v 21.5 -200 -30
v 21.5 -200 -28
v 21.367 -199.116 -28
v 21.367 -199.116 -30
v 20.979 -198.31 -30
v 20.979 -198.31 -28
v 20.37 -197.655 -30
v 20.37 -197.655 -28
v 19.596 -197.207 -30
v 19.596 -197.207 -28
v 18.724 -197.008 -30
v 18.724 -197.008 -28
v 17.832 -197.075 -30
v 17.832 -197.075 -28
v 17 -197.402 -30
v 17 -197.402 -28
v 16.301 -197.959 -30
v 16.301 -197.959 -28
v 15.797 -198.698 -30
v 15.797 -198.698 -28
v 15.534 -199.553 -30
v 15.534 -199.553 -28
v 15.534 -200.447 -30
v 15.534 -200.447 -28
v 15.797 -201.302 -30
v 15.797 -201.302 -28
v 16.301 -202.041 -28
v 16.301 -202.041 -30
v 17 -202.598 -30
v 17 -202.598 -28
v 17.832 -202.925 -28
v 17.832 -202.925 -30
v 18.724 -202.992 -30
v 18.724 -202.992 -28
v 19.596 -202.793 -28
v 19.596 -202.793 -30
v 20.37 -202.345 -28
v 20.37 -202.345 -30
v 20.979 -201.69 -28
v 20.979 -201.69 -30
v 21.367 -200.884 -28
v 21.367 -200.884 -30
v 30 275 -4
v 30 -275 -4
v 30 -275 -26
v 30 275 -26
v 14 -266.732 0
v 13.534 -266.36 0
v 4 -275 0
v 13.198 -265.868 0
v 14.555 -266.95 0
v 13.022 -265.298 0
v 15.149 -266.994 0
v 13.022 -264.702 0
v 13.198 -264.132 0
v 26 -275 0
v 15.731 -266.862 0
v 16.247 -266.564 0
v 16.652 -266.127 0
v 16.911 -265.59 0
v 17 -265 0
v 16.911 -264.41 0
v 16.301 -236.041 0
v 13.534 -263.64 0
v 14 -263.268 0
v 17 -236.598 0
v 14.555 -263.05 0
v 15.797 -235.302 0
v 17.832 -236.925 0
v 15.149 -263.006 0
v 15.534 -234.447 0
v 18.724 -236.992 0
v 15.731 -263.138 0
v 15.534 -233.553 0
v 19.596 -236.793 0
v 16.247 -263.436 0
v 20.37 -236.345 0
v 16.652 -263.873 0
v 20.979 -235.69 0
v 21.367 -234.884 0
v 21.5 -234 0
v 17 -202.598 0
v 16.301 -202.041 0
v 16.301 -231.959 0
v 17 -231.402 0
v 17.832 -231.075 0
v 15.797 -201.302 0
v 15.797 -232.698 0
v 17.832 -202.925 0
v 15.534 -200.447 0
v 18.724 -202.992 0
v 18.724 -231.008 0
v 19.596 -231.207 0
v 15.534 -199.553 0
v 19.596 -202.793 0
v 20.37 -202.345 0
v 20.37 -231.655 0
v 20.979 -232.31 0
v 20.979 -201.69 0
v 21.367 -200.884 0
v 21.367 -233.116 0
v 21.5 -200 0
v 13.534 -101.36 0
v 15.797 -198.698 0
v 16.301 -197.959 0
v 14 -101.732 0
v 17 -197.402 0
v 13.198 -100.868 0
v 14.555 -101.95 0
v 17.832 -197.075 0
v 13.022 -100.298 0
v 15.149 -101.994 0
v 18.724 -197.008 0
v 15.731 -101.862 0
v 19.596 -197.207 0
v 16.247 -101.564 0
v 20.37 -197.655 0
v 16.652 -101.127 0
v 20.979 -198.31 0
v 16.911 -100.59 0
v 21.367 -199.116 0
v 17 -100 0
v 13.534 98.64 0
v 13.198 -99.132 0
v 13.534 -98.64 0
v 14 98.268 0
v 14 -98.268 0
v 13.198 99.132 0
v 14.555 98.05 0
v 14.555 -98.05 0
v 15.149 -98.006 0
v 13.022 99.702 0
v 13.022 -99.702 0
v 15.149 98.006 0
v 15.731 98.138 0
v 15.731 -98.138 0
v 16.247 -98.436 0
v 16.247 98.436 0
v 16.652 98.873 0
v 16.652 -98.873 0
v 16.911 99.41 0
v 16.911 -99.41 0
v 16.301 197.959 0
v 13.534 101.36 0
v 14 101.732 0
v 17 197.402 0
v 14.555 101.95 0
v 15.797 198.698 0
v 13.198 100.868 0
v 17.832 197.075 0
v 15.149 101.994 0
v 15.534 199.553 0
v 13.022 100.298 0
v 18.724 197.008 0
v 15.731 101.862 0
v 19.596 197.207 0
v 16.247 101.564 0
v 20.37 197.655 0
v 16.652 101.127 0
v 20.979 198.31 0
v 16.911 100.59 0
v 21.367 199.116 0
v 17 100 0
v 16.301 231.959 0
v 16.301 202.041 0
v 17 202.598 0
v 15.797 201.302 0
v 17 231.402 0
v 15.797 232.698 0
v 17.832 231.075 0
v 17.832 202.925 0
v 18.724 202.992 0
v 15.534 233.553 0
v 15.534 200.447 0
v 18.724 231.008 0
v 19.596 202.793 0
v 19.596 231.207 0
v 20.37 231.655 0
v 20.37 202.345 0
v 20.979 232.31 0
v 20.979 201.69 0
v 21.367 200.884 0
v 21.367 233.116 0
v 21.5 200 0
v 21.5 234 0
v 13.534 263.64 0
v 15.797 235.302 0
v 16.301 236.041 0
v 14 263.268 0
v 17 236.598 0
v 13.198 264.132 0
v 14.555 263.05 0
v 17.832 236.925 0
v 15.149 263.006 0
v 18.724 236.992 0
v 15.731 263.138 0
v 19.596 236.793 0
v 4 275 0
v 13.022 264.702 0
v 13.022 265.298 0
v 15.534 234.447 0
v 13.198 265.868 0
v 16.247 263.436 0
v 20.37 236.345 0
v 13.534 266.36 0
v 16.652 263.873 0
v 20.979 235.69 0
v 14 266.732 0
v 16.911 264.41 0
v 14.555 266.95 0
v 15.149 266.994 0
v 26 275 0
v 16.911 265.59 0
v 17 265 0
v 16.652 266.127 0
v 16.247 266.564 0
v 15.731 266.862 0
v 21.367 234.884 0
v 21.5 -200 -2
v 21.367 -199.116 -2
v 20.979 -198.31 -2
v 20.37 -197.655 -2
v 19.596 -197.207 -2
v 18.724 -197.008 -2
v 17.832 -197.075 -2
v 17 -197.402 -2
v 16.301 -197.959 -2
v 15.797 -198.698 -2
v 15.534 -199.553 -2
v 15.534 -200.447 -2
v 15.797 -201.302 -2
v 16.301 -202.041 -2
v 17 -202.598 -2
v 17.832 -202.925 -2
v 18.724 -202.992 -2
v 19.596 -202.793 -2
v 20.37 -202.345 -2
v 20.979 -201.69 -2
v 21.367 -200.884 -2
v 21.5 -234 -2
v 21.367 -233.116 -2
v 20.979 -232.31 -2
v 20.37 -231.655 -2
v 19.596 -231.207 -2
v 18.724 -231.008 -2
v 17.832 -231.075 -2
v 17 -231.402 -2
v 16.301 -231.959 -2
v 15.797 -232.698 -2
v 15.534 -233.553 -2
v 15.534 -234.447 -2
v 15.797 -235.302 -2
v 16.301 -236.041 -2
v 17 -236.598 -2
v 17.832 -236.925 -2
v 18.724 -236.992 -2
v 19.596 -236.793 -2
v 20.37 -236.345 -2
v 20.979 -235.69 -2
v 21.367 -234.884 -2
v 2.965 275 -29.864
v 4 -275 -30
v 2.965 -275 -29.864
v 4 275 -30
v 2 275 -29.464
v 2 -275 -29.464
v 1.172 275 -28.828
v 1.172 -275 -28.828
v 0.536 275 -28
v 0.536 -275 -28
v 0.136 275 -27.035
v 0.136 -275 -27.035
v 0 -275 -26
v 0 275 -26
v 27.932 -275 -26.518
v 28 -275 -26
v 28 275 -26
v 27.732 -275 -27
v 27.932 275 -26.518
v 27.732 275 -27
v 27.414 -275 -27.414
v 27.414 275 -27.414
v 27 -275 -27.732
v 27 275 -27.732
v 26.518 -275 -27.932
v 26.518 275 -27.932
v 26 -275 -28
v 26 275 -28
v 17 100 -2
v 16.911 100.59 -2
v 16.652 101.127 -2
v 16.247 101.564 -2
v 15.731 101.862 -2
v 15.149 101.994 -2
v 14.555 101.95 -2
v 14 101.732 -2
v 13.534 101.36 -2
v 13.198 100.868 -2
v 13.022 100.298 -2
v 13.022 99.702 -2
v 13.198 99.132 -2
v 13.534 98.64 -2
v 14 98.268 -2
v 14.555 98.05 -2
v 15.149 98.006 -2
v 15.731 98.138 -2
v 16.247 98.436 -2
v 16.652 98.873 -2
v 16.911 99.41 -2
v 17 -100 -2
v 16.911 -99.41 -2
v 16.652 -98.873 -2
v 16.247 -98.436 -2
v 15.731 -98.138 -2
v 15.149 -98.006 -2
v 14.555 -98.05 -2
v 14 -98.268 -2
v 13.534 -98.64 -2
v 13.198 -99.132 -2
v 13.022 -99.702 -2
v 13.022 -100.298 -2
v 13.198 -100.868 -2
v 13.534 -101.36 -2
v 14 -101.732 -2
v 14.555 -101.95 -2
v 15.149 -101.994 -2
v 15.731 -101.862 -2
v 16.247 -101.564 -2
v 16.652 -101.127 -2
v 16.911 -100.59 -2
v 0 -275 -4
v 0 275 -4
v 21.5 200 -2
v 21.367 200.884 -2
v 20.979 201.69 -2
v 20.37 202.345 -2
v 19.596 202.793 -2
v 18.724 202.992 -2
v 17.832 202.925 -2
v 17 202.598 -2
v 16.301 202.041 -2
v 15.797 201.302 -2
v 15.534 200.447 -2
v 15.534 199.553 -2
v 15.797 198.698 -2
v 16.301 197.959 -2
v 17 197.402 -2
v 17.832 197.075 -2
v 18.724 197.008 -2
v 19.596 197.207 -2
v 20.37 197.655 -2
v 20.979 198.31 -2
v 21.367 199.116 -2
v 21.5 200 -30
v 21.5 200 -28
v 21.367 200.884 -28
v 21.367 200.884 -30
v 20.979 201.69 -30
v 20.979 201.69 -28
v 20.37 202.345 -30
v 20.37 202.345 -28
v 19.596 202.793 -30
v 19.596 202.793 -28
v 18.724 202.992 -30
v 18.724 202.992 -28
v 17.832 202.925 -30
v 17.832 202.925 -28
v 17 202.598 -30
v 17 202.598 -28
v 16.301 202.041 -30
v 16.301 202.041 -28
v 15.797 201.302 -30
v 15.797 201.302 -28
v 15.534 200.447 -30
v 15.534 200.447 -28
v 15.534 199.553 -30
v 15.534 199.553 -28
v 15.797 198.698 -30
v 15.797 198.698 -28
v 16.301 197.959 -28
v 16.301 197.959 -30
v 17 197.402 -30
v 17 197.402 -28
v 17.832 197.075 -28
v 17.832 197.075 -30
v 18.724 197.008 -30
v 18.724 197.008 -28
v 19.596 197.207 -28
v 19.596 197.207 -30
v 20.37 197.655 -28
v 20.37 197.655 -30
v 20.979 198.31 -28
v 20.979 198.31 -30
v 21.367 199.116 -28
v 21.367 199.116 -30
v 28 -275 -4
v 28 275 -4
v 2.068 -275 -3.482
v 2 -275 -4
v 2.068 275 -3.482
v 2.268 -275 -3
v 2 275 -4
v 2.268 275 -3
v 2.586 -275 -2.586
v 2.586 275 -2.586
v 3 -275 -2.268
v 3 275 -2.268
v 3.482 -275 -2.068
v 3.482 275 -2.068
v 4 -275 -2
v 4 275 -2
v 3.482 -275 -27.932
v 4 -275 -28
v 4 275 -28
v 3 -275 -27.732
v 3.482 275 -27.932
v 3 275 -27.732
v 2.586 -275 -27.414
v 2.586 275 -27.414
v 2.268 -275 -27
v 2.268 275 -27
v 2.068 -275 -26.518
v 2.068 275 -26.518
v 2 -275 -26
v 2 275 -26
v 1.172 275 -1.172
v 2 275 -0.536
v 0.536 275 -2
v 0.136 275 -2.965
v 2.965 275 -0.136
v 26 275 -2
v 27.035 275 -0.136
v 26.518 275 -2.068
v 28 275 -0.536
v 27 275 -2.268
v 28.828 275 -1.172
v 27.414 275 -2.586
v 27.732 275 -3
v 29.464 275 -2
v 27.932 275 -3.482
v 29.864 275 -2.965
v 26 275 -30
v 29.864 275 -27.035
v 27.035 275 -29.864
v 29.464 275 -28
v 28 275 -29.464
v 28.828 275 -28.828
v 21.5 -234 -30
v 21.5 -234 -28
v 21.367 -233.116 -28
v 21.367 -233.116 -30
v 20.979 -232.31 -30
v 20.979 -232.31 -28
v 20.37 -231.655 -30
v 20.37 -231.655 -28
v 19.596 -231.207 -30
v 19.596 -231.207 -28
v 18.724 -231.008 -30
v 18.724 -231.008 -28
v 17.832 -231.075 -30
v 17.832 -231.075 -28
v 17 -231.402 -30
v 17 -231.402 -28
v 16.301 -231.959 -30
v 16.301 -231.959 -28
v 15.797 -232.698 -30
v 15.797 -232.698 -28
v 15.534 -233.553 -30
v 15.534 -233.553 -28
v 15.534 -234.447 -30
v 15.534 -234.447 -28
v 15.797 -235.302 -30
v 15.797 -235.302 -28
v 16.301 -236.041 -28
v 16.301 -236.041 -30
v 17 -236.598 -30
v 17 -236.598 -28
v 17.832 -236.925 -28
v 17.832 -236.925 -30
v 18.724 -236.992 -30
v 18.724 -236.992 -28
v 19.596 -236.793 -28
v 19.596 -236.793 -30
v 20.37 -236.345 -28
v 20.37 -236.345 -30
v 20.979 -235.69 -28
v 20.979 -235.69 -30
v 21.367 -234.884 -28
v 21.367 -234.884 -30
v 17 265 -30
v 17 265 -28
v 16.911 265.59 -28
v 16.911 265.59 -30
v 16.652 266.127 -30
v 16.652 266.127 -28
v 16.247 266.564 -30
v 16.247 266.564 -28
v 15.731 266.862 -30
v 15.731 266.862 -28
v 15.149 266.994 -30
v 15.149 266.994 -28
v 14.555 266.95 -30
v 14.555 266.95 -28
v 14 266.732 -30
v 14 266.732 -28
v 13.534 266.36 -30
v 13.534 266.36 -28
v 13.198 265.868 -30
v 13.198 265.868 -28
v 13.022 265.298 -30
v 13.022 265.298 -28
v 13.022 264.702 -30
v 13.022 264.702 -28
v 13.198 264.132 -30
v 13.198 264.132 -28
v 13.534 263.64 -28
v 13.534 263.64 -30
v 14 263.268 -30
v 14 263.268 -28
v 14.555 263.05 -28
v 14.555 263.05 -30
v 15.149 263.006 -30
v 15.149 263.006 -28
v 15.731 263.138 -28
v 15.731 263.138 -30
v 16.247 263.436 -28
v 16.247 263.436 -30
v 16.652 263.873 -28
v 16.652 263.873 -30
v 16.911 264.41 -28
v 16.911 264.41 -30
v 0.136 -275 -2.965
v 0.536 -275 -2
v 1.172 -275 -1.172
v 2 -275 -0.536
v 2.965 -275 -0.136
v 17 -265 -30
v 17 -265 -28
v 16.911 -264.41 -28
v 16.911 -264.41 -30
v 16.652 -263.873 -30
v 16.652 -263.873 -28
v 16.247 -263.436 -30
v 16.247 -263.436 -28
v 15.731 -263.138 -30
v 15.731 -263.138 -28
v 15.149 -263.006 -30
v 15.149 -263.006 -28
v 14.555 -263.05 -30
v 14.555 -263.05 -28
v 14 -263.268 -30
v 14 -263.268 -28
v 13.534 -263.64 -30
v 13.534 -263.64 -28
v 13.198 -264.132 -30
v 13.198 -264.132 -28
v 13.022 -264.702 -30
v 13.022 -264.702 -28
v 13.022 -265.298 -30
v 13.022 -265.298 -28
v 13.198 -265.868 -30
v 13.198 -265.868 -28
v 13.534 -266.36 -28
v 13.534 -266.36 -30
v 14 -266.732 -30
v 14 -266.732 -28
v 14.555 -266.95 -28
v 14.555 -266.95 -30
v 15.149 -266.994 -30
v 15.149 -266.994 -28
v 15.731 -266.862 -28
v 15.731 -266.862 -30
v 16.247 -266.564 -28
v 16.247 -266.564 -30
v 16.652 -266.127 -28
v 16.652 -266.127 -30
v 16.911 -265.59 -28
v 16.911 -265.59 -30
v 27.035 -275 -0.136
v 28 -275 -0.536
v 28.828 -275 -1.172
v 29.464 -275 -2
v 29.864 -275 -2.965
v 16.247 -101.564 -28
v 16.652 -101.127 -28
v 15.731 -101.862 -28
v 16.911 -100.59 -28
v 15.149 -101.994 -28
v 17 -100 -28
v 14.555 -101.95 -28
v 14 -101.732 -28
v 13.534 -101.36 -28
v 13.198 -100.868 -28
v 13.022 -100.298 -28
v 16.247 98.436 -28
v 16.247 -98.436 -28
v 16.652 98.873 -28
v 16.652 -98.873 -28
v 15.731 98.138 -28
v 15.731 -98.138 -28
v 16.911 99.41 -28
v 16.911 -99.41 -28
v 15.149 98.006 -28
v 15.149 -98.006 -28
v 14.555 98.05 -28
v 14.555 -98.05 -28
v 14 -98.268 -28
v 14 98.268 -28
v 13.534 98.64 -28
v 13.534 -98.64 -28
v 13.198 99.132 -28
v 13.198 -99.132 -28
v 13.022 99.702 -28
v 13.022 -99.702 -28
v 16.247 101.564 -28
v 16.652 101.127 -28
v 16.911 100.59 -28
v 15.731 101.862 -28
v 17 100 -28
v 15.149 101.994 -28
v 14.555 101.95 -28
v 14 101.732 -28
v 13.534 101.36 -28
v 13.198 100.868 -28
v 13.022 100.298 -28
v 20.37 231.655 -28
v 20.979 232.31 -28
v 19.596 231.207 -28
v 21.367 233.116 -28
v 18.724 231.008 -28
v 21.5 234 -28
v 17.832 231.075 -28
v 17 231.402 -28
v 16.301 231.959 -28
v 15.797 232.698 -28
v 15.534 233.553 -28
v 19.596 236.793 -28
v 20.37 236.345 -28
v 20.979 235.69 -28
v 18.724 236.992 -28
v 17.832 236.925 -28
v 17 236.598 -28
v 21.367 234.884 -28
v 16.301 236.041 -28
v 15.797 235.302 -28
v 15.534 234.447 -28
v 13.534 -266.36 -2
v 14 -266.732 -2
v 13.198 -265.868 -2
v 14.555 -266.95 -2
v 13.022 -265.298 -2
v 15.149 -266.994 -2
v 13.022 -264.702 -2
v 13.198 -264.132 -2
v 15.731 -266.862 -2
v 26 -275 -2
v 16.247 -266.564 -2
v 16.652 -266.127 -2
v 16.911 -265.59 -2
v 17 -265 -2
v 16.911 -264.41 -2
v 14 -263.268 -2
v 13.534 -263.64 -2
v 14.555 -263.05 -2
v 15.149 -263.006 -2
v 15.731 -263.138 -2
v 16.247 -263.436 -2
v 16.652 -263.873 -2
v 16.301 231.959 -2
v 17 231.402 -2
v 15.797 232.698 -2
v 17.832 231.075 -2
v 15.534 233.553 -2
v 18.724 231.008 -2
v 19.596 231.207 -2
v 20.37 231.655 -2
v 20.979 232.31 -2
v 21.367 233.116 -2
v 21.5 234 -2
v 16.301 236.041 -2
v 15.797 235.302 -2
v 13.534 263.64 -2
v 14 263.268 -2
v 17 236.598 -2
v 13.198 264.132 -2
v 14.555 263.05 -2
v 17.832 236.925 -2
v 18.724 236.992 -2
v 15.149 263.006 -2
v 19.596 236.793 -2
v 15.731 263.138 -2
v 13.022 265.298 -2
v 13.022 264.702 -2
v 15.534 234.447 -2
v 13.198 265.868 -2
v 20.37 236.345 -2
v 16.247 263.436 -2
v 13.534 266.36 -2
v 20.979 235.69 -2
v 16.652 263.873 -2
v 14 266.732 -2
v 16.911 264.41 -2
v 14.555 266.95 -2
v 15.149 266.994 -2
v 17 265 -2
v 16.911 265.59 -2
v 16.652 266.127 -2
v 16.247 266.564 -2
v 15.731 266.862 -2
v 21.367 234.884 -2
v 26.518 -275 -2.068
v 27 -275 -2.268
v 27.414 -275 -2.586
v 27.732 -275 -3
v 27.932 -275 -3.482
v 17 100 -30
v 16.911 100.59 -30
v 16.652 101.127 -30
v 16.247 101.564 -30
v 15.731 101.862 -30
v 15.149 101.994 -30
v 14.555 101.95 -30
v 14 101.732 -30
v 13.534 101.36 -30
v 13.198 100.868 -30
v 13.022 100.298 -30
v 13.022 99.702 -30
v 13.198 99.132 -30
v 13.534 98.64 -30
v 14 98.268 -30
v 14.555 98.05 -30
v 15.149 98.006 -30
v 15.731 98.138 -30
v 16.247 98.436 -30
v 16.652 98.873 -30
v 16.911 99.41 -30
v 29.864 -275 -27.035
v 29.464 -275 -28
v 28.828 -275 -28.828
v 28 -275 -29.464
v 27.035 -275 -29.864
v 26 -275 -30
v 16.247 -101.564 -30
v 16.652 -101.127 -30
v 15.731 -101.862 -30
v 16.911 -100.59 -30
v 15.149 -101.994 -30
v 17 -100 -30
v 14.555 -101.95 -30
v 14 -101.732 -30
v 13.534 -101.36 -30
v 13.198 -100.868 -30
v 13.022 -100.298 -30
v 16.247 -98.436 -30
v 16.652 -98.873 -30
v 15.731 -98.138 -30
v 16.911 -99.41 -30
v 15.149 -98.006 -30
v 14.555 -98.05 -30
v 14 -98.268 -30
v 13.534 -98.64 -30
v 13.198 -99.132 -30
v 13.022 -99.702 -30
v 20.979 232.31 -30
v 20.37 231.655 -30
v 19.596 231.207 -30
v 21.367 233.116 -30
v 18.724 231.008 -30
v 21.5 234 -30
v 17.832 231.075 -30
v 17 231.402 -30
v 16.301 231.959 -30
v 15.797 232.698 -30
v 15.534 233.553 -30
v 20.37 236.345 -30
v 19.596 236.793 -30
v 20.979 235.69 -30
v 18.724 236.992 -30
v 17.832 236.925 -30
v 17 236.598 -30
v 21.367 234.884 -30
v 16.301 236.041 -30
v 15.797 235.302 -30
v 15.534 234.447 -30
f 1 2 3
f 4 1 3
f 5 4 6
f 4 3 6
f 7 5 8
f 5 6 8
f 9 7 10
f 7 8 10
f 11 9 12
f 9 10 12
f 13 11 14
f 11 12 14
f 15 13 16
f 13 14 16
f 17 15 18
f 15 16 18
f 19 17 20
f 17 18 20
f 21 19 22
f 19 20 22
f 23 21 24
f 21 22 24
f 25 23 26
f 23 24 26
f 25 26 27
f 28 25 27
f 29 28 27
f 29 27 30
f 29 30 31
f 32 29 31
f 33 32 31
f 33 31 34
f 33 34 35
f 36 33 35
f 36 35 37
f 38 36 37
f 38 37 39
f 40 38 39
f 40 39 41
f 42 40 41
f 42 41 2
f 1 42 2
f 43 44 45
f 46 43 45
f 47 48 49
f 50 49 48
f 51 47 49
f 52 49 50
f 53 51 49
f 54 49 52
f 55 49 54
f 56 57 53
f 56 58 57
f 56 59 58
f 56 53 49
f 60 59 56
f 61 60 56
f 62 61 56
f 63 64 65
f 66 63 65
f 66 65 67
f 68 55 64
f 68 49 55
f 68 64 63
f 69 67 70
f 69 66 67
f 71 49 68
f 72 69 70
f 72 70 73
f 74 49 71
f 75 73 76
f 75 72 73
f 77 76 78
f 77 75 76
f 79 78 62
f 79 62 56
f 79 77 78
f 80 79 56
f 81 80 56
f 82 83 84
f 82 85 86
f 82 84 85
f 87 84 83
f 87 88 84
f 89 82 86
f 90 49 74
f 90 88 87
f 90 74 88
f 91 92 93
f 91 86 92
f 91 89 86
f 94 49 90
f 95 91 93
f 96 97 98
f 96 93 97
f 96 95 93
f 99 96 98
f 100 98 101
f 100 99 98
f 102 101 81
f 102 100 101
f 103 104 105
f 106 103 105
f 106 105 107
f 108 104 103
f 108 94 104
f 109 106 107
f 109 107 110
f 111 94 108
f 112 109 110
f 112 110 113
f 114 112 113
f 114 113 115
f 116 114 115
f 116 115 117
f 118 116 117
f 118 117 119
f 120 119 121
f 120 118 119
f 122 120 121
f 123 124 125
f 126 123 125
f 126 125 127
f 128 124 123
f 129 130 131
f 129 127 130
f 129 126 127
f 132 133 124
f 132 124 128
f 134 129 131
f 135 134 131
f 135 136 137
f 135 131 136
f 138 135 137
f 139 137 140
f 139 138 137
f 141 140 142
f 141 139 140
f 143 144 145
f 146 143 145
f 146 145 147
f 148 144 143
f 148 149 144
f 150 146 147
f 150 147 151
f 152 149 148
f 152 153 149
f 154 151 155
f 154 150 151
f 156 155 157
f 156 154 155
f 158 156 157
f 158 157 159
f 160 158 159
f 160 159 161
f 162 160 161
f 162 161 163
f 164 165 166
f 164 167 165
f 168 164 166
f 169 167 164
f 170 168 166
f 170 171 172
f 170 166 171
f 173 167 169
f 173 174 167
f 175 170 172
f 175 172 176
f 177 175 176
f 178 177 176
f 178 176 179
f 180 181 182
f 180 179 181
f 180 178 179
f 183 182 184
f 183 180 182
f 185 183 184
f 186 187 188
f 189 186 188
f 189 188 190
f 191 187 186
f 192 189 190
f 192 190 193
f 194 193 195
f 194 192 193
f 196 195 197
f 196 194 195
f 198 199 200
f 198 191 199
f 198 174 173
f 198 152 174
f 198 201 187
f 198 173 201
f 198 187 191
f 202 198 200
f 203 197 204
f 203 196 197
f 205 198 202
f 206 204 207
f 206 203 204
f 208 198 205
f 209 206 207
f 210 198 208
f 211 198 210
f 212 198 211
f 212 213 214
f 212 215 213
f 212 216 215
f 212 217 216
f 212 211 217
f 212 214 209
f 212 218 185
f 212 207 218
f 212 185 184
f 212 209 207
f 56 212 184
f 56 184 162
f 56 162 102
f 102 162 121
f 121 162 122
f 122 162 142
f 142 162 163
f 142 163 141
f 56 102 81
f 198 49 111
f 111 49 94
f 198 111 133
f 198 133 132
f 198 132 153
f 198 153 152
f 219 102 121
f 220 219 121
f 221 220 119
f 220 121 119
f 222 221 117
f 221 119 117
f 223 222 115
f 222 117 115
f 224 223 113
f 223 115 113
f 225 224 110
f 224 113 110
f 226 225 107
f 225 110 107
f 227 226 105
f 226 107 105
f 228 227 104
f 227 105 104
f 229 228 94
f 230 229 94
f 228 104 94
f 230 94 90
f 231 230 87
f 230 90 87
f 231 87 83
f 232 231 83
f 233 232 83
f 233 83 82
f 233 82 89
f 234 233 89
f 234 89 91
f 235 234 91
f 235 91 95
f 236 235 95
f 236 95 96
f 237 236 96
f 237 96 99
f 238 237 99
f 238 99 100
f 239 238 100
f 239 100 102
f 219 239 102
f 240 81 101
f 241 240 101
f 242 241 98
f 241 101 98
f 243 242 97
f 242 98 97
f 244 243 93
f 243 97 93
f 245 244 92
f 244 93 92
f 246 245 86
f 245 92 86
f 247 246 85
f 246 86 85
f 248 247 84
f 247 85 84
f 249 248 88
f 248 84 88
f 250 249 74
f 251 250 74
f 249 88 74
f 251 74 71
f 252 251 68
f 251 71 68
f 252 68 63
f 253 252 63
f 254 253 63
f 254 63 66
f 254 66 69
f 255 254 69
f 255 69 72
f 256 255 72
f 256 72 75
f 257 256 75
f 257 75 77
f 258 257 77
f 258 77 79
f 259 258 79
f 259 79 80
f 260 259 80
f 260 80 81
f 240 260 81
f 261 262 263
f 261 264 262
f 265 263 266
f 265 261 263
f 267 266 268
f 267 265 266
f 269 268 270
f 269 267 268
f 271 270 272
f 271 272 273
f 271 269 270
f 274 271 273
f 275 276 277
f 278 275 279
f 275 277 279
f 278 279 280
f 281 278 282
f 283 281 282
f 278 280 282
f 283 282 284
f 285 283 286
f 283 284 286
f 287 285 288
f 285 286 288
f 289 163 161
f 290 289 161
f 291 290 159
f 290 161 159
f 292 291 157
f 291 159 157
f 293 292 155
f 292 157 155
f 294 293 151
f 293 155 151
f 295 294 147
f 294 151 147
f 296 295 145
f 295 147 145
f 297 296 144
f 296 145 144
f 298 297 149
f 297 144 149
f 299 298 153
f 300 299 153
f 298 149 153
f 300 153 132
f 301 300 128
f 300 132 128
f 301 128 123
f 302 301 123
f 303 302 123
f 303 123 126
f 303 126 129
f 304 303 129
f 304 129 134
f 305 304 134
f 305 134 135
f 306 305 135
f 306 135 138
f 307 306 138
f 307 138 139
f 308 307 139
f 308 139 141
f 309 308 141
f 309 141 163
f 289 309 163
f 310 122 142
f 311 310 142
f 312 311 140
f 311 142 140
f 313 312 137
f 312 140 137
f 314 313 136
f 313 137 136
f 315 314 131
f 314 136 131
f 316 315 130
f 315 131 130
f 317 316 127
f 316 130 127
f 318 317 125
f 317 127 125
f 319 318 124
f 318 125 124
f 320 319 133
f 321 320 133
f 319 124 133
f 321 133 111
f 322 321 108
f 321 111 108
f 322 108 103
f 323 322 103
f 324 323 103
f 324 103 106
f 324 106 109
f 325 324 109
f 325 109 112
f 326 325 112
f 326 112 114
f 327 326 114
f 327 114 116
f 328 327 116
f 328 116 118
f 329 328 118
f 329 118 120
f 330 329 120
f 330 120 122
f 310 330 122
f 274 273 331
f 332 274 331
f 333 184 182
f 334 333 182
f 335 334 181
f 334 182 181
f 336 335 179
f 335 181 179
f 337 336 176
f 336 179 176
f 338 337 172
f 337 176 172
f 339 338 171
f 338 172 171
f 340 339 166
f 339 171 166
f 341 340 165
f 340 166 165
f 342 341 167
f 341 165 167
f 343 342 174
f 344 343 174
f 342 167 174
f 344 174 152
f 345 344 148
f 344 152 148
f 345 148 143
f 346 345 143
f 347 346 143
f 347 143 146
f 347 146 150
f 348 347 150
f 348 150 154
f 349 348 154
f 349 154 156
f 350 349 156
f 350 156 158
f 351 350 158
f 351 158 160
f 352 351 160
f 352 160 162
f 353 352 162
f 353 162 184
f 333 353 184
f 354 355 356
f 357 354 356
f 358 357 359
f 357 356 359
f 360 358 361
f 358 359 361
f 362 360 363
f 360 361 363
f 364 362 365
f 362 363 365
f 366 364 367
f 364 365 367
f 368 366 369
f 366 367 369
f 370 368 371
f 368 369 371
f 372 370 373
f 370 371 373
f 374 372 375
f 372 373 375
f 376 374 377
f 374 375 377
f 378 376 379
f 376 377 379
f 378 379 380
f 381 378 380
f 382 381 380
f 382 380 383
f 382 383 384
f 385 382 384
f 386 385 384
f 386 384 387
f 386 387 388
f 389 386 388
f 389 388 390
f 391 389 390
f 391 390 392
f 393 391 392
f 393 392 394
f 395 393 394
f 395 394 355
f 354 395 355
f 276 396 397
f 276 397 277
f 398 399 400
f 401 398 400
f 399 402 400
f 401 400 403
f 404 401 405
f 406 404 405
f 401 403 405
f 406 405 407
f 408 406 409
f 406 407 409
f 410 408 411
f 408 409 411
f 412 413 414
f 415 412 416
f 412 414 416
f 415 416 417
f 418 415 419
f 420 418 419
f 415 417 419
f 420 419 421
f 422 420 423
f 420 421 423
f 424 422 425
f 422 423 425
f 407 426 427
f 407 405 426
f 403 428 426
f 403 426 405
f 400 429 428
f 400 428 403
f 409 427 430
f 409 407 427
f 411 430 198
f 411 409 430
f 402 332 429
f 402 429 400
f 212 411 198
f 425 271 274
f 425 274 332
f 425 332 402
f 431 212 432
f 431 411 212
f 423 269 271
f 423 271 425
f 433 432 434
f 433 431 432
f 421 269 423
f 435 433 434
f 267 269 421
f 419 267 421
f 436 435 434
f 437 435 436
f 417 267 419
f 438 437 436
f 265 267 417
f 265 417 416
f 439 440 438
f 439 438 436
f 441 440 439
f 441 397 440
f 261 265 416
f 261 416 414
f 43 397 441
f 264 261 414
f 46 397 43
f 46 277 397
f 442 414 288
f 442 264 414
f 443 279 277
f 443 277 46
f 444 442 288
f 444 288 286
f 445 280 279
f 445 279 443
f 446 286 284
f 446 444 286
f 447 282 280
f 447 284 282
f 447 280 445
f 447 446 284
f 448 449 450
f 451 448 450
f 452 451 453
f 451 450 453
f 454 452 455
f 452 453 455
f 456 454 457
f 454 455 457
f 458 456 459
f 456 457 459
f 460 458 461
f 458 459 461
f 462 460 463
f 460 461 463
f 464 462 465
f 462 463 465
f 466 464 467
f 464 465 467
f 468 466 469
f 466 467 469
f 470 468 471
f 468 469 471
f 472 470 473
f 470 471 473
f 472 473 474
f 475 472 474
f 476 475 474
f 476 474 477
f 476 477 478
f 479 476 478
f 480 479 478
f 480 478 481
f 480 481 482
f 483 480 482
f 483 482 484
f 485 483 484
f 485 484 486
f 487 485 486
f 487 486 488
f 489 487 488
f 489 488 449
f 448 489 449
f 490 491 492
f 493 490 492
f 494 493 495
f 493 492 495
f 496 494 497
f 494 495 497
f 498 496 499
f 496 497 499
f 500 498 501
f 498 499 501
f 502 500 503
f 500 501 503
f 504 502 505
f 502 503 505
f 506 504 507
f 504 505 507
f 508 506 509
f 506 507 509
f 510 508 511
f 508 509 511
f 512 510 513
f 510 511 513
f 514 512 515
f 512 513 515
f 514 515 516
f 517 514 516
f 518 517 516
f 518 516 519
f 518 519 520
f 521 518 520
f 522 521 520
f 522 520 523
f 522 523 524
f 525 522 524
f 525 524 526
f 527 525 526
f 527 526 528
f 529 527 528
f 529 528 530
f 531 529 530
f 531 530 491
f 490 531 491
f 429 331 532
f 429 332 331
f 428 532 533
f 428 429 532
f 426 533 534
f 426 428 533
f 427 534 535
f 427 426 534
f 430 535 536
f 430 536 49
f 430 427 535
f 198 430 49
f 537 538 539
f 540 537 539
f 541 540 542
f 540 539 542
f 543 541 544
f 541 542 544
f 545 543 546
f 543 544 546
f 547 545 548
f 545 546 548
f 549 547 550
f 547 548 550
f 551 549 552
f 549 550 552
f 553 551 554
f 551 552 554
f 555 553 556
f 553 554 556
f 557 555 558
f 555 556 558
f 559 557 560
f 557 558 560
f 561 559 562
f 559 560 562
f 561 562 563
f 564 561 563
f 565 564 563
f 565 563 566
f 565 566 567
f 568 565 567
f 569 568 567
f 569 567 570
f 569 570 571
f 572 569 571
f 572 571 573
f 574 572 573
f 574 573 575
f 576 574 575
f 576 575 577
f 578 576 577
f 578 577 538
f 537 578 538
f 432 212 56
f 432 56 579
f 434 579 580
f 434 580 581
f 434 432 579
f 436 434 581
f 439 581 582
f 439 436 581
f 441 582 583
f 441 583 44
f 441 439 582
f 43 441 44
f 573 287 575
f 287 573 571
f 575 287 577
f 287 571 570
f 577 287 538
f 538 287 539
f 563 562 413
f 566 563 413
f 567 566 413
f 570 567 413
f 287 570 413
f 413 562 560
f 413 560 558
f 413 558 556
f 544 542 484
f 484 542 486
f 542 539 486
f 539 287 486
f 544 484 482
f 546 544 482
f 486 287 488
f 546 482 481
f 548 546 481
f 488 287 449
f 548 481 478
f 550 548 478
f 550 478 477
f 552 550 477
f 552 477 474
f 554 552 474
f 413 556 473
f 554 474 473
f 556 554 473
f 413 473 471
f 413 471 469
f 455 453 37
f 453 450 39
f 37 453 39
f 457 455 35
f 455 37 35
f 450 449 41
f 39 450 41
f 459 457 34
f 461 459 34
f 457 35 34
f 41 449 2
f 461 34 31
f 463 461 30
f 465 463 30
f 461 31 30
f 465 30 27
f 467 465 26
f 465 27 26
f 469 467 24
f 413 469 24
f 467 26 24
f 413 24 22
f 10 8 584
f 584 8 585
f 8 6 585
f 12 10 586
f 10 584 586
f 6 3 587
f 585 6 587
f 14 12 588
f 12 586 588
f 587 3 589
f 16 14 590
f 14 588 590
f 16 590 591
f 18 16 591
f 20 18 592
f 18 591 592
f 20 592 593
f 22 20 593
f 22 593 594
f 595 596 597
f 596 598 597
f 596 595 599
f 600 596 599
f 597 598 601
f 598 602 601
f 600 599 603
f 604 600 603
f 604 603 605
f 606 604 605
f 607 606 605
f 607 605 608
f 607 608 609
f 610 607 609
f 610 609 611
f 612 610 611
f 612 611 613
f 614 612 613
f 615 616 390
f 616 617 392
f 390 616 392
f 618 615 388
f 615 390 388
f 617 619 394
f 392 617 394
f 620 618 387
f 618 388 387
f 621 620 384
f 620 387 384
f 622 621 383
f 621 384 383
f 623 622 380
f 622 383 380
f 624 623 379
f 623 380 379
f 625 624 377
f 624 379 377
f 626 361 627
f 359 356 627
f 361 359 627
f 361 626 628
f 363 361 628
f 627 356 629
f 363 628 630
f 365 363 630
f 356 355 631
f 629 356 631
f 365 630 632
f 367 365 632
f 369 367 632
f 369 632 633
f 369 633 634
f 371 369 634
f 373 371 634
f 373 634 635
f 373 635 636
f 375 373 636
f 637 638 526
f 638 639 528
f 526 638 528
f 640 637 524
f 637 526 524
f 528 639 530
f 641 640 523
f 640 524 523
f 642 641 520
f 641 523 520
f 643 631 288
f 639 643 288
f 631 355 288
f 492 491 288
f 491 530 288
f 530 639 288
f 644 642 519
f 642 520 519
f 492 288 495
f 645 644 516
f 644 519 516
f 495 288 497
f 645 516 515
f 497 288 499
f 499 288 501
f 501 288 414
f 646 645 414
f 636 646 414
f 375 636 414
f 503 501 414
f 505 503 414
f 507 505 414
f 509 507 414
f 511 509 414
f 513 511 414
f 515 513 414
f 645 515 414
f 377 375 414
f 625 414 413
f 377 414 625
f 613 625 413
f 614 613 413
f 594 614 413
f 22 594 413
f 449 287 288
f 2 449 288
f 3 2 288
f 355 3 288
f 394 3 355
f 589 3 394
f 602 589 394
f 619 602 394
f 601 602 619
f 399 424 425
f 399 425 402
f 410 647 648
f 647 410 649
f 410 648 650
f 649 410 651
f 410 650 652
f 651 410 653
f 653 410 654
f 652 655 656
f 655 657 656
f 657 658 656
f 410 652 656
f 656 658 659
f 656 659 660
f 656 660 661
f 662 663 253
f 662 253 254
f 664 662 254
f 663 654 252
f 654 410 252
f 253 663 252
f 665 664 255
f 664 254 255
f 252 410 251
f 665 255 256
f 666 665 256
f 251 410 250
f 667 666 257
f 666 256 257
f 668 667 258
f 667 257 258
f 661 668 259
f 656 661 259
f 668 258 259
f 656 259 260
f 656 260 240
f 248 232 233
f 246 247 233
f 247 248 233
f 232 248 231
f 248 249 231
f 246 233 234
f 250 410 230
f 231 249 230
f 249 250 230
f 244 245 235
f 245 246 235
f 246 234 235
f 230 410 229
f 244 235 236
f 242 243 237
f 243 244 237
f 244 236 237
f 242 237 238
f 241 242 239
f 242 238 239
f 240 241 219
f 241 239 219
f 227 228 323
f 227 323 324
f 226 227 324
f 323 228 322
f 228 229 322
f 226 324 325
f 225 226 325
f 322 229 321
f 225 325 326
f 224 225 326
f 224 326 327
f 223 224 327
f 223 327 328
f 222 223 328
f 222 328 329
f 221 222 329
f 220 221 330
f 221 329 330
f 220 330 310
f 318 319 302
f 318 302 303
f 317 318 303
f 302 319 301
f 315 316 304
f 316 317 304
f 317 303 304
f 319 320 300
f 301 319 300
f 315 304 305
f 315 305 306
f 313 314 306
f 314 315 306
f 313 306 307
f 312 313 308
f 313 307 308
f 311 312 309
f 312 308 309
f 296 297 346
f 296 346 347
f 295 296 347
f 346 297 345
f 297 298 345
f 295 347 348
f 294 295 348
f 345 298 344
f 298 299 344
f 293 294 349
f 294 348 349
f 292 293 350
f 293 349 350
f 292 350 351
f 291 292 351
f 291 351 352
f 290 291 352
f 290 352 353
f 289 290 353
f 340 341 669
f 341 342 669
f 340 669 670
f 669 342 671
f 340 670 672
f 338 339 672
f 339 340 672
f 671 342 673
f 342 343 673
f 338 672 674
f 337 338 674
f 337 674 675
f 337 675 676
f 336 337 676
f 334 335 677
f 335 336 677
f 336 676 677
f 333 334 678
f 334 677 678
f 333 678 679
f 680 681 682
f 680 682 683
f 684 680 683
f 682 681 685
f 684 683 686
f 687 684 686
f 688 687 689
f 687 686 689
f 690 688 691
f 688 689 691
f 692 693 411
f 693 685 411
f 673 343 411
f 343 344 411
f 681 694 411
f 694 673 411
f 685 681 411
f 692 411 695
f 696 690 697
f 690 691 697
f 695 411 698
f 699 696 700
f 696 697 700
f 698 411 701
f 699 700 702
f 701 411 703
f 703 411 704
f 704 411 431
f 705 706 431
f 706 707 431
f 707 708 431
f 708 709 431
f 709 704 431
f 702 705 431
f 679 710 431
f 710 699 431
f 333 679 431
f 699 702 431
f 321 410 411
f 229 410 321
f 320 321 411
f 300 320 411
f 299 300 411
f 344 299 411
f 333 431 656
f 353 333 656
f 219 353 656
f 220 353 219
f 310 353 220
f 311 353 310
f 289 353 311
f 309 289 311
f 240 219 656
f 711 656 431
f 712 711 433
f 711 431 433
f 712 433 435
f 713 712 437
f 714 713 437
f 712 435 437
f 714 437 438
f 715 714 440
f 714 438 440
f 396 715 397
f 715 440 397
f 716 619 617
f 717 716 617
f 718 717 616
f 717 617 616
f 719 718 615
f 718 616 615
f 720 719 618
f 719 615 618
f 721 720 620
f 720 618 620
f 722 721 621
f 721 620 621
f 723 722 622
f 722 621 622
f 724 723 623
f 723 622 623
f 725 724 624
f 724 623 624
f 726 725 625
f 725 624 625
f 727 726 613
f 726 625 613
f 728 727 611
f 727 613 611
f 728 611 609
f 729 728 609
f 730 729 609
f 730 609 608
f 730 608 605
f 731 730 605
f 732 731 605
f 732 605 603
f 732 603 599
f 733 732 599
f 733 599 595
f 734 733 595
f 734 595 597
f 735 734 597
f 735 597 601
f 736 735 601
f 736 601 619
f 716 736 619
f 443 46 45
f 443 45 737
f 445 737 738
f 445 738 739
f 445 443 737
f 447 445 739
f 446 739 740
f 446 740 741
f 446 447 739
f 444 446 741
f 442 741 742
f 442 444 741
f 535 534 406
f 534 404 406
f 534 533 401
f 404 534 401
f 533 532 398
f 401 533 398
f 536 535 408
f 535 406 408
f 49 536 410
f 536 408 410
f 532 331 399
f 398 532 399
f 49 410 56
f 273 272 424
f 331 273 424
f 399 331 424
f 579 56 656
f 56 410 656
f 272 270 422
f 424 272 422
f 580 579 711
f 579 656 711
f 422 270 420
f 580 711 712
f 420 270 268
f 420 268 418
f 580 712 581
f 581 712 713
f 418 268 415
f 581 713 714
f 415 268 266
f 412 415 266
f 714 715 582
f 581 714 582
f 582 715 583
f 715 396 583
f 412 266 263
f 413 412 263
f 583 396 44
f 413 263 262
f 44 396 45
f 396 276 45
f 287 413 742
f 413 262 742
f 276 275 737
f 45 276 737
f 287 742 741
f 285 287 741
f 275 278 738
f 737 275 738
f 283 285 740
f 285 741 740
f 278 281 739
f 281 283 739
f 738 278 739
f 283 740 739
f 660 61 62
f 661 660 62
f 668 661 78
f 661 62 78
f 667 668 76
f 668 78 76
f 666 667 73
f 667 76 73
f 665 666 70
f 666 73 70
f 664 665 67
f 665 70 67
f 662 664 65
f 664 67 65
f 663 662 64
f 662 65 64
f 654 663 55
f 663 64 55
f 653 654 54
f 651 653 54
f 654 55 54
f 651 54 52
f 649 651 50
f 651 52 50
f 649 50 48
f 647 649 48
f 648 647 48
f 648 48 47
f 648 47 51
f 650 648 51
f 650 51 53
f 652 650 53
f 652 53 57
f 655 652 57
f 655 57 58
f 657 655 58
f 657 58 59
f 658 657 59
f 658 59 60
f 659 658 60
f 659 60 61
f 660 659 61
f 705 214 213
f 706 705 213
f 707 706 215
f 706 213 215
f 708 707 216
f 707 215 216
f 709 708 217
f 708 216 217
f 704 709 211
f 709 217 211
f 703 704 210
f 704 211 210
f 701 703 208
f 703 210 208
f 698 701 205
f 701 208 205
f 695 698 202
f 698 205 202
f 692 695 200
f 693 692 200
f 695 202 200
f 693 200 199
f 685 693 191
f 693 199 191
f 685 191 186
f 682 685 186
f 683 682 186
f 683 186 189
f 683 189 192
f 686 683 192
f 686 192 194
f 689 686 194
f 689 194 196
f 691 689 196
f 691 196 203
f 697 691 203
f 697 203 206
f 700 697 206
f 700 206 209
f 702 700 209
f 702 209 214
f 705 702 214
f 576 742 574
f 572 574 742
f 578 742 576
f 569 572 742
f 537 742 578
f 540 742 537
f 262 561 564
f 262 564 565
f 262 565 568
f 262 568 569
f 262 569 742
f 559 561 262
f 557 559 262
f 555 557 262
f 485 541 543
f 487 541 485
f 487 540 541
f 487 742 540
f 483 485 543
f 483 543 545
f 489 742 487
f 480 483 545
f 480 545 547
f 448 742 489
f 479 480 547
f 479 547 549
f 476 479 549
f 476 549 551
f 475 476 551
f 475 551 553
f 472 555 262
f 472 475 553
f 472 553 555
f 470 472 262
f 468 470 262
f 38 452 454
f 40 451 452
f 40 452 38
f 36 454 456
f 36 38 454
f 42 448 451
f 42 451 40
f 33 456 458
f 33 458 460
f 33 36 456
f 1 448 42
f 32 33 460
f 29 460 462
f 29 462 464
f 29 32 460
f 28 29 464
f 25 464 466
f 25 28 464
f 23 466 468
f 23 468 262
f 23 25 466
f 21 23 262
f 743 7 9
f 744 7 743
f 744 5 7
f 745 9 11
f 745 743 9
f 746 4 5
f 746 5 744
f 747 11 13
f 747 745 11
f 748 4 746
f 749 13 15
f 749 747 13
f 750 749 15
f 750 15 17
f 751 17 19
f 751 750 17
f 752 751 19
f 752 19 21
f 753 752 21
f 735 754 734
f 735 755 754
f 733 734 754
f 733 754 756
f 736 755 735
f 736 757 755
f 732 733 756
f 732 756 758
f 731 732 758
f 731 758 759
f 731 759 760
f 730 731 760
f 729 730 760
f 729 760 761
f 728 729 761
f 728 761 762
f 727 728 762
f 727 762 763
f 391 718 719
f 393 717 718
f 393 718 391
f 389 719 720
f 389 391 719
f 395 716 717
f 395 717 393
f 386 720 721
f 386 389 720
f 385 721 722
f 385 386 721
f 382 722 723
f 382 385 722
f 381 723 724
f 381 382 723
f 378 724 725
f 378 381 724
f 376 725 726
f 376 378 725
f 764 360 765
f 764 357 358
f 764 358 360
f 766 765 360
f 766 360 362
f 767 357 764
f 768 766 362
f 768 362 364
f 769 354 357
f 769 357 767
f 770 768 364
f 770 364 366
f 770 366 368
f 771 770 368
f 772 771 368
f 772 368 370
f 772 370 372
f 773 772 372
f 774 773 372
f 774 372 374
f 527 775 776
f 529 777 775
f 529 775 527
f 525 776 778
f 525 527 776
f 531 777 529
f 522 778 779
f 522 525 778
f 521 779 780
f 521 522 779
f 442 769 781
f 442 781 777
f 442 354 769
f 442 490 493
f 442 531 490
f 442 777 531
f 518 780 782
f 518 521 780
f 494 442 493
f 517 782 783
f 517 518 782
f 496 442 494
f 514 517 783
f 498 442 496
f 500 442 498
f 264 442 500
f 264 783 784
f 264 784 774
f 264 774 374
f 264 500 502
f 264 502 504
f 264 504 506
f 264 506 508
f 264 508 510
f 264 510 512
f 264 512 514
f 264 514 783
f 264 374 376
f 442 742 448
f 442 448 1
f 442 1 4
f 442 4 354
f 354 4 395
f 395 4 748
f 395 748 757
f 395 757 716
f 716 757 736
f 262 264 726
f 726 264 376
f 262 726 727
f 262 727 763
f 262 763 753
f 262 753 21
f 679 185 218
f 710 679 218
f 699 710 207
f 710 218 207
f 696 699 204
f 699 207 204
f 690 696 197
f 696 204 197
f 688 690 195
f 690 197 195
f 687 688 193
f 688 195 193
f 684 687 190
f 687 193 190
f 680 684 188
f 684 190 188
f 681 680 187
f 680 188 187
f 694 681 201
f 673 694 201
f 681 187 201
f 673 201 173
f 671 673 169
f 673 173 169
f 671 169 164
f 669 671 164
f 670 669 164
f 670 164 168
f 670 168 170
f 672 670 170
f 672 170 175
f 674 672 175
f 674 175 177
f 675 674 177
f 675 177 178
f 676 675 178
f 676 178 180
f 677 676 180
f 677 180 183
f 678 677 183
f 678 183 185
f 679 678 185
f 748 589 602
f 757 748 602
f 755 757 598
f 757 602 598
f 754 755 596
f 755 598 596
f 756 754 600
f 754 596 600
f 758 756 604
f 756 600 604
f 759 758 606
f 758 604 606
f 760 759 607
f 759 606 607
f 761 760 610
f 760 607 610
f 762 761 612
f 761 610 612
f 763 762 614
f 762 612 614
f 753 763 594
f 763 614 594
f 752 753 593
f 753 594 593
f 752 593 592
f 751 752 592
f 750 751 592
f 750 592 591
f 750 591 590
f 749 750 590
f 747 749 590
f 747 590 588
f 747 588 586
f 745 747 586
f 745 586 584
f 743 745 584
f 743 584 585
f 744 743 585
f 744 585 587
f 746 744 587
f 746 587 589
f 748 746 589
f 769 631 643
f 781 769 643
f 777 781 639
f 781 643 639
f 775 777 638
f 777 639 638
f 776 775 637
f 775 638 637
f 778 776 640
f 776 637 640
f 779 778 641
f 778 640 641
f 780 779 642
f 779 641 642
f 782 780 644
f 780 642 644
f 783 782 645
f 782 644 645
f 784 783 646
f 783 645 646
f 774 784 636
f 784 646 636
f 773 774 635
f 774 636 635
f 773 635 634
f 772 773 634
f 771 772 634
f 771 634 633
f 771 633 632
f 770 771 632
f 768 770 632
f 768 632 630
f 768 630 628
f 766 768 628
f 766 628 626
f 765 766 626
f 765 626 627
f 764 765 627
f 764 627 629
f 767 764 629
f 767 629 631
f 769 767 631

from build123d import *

# Parameters (mm, degrees)
EXTRUDE_1_DEPTH     = 275
SKETCH_2_R          = 3
SKETCH_2_R_2        = 2
CUT_EXTRUDE_1_DEPTH = 279.25348156


with BuildPart() as part:
    # 草图1 → 凸台-拉伸1 (new, symmetric)
    with BuildSketch(Plane(origin=(0, 0, 0), x_dir=(1, 0, 0), z_dir=(0, 1, 0))):
        with BuildLine():
            Line((4, 0), (26, 0))
            ThreePointArc((26, 0), (28.828427125, 1.171572875), (30, 4))
            Line((30, 4), (30, 26))
            ThreePointArc((30, 26), (28.828427125, 28.828427125), (26, 30))
            Line((26, 30), (4, 30))
            ThreePointArc((4, 30), (1.171572875, 28.828427125), (0, 26))
            Line((0, 26), (0, 4))
            ThreePointArc((0, 4), (1.171572875, 1.171572875), (4, 0))
        make_face()
        with BuildLine():
            Line((4, 2), (26, 2))
            ThreePointArc((26, 2), (27.414213562, 2.585786438), (28, 4))
            Line((28, 4), (28, 26))
            ThreePointArc((28, 26), (27.414213562, 27.414213562), (26, 28))
            Line((26, 28), (4, 28))
            ThreePointArc((4, 28), (2.585786438, 27.414213562), (2, 26))
            Line((2, 26), (2, 4))
            ThreePointArc((2, 4), (2.585786438, 2.585786438), (4, 2))
        make_face(mode=Mode.SUBTRACT)
    extrude(amount=EXTRUDE_1_DEPTH, both=True)

    # 草图2 → 切除-拉伸1 (cut, through all)
    with BuildSketch(Plane.XY):
        with Locations((18.5, 234)):
            Circle(SKETCH_2_R)
        with Locations((18.5, 200)):
            Circle(SKETCH_2_R)
        with Locations((18.5, -200)):
            Circle(SKETCH_2_R)
        with Locations((18.5, -234)):
            Circle(SKETCH_2_R)
        with Locations((15, 265)):
            Circle(SKETCH_2_R_2)
        with Locations((15, 100)):
            Circle(SKETCH_2_R_2)
        with Locations((15, -100)):
            Circle(SKETCH_2_R_2)
        with Locations((15, -265)):
            Circle(SKETCH_2_R_2)
    extrude(amount=-CUT_EXTRUDE_1_DEPTH, mode=Mode.SUBTRACT)


solid = part.part
